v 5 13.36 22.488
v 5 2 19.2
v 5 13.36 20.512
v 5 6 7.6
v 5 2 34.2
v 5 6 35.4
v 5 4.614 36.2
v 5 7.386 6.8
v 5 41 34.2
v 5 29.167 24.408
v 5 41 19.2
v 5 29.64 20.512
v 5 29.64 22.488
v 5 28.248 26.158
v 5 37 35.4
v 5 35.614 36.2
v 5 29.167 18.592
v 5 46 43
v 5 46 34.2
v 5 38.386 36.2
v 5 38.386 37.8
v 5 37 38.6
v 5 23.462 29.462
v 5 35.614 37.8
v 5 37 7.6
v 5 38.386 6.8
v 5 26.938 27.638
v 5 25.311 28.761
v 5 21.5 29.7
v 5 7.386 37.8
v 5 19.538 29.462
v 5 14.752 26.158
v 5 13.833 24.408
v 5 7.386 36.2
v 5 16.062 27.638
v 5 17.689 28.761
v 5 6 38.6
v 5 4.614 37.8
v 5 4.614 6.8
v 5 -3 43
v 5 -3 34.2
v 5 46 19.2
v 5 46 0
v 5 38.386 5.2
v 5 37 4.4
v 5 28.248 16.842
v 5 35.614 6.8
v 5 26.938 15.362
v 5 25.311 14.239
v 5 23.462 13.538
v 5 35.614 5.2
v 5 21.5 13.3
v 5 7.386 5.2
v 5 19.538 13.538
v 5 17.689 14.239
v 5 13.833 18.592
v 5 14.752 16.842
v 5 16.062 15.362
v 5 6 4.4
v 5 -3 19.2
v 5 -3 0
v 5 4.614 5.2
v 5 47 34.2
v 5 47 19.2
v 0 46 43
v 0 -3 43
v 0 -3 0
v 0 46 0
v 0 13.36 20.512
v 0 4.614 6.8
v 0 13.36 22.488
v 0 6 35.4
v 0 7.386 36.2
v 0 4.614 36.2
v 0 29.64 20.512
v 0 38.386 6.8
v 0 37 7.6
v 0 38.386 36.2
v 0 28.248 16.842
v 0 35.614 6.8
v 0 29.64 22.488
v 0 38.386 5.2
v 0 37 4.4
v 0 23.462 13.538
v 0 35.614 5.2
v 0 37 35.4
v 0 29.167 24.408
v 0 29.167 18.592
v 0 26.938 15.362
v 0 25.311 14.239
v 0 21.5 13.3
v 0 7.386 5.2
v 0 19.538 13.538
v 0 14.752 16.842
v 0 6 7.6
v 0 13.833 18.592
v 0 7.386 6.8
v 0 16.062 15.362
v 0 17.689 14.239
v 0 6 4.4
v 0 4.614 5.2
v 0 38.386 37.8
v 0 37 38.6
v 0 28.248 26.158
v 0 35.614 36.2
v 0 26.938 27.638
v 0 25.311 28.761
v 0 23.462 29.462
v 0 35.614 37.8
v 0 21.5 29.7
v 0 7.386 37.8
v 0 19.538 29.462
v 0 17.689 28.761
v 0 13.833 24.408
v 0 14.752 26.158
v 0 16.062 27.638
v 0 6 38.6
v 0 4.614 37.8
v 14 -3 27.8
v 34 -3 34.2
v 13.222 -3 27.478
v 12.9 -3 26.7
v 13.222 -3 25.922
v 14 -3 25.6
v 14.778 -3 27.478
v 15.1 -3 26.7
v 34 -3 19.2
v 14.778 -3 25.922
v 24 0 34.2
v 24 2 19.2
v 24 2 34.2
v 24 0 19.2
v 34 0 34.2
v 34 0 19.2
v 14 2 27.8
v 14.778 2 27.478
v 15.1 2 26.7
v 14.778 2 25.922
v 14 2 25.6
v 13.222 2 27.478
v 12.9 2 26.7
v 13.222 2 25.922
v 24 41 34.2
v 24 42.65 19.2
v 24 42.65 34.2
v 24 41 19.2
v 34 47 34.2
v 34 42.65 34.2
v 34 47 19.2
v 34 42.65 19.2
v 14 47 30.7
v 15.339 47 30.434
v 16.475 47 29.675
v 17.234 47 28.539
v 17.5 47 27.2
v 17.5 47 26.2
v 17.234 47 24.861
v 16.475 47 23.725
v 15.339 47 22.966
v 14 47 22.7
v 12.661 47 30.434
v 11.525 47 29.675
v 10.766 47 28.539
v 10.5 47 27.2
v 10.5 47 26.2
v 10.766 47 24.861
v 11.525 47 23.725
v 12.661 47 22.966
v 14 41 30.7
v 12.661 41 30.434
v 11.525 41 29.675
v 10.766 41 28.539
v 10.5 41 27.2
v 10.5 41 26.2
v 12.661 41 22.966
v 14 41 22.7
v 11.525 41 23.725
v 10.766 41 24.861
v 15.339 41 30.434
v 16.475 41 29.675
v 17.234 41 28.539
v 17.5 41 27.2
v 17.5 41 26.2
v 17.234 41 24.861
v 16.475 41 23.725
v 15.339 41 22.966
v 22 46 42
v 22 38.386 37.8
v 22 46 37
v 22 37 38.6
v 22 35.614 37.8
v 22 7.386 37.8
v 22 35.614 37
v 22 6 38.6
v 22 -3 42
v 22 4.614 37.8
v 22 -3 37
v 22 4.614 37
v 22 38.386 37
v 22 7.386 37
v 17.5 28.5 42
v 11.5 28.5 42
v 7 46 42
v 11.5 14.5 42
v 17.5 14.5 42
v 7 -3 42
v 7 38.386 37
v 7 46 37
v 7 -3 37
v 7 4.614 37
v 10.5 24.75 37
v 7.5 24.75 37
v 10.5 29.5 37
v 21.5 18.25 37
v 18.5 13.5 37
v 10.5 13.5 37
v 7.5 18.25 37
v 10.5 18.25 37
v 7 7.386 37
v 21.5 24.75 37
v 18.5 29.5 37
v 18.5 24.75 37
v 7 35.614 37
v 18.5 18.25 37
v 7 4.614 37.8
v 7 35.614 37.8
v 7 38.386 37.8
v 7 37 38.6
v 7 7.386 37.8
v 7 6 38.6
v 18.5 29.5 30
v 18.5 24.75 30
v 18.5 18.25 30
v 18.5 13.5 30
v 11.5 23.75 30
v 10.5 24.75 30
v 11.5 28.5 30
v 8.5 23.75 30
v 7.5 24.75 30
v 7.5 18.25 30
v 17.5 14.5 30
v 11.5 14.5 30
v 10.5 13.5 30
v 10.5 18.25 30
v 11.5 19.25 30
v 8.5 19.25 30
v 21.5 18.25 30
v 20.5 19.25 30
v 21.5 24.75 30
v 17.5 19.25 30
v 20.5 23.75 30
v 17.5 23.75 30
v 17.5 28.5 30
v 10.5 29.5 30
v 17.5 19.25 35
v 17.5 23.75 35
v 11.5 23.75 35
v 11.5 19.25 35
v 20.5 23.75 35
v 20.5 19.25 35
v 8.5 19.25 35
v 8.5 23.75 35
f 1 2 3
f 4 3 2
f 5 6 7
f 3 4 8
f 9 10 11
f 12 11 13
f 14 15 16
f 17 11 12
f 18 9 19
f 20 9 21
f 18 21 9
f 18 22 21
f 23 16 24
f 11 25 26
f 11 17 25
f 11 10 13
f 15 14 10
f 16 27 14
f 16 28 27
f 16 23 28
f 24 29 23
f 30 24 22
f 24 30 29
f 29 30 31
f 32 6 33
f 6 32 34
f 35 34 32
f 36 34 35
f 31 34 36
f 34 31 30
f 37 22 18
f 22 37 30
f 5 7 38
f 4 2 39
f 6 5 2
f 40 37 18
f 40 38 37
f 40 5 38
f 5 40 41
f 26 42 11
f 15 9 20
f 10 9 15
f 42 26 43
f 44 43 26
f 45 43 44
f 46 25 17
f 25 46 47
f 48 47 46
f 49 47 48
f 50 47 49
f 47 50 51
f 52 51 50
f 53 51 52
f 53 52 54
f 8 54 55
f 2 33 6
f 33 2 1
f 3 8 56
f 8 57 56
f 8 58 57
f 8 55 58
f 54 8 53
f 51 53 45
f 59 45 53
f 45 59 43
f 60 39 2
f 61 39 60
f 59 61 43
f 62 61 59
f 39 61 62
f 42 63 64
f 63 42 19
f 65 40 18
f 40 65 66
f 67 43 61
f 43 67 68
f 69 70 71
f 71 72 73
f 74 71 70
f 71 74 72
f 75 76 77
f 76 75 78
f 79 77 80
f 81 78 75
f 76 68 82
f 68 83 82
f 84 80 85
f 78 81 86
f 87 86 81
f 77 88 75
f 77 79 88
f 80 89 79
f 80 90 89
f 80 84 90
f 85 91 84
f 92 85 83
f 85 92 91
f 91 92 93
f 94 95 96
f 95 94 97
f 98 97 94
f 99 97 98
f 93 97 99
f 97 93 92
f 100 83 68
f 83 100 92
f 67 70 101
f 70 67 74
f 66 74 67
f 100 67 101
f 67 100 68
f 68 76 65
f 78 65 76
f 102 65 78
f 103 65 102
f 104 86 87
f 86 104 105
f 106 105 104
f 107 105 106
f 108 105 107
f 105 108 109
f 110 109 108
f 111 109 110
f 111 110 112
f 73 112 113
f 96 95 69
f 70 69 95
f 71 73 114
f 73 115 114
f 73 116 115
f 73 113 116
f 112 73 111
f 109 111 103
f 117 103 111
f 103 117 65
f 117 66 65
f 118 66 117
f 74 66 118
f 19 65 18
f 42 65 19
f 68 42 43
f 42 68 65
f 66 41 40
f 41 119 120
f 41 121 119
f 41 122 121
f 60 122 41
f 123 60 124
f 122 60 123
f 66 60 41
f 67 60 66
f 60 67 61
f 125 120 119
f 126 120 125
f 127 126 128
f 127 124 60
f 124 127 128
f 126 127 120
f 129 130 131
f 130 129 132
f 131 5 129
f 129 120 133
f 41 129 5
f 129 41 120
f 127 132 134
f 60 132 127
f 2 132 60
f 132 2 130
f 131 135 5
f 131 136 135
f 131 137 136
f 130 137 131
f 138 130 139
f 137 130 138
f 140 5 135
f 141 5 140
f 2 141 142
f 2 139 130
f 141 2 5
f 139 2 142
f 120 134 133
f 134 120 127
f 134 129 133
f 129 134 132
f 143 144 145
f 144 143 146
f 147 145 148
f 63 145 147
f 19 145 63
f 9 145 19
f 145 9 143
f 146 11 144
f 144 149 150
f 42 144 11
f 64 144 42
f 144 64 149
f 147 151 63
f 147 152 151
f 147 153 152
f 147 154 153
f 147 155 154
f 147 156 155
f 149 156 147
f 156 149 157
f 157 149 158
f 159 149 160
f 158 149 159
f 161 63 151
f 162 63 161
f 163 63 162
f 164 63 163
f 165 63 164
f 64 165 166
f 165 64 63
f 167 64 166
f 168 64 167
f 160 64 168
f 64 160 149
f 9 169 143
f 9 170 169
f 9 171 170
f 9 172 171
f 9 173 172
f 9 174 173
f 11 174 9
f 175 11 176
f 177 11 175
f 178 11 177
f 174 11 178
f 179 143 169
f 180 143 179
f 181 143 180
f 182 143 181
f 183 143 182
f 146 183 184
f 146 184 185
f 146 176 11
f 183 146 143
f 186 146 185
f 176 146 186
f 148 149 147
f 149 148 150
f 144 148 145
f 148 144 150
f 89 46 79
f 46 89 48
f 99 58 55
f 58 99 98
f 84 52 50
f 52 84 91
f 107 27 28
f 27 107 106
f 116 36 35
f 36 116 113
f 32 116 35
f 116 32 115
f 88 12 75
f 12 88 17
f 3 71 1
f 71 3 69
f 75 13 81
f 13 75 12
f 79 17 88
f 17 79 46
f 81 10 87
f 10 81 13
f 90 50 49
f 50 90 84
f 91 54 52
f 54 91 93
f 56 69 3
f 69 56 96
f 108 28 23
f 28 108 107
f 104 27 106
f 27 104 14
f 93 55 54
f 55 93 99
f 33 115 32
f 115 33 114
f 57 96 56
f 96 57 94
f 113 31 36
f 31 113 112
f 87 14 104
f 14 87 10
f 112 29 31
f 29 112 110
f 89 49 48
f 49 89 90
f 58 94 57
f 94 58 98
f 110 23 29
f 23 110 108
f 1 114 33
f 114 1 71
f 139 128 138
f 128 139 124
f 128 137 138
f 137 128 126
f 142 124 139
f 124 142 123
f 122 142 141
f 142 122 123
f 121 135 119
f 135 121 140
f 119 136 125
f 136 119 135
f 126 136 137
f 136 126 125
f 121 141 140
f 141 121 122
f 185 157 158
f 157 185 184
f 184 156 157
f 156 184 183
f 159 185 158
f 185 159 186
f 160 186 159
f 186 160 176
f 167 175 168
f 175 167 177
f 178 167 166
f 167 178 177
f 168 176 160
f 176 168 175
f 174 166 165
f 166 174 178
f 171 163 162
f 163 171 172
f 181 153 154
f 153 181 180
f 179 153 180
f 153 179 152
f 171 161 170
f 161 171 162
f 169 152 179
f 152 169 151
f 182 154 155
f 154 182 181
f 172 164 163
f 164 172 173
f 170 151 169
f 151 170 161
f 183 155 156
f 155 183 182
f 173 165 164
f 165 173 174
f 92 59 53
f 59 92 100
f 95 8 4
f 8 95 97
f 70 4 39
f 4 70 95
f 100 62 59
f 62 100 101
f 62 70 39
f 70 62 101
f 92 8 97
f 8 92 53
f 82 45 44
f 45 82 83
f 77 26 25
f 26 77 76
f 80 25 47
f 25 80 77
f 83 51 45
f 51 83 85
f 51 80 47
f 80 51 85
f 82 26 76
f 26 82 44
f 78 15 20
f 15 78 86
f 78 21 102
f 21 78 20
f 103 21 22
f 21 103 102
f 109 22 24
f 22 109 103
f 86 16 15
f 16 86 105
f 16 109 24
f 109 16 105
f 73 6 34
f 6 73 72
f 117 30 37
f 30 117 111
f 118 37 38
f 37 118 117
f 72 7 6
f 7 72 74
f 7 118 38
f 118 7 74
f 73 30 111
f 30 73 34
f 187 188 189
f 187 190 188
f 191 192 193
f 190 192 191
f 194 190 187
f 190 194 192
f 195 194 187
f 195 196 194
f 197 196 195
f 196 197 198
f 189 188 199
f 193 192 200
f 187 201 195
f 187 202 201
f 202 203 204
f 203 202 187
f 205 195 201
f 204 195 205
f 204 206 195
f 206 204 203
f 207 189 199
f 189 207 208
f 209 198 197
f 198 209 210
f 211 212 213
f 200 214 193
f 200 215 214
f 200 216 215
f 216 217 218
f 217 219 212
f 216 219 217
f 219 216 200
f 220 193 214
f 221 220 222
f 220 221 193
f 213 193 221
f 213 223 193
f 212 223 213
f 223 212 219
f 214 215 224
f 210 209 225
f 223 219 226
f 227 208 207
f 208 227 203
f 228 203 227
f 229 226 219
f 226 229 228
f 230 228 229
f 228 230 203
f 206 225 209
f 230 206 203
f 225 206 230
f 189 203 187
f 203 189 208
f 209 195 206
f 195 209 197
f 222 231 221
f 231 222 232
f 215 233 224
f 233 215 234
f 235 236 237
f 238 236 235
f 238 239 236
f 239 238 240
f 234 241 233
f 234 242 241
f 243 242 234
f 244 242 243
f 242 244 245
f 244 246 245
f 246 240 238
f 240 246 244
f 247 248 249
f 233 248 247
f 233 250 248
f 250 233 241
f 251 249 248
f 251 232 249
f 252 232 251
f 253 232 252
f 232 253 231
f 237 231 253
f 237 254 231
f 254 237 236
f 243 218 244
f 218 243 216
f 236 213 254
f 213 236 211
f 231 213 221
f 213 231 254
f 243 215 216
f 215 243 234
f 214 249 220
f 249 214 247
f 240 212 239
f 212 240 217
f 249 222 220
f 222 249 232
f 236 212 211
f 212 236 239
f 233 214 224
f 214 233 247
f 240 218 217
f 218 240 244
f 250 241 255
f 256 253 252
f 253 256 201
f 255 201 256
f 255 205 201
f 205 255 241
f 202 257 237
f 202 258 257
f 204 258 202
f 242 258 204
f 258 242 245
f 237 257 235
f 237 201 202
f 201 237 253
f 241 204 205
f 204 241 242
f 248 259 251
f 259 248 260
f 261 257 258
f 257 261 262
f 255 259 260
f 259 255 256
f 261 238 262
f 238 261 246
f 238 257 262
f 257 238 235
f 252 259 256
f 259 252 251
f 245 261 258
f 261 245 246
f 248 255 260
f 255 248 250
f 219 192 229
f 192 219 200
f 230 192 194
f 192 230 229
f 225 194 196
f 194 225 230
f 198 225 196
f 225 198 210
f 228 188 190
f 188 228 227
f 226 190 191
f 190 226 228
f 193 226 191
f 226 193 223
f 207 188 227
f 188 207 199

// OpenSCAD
//translate([100,0,0]) import("./bowden_trubicky.stl");
tolerance=0.5;
polomer_bow=3.5;
difference() {
	union() {
		translate([0,-3,0]) cube([5,43+6,43]);

		translate([5,-3,19.2]) cube([19,5,15]);
		translate([24,-3,19.2]) cube([10,3,15]);

		translate([5,41,19.2]) cube([19,6,15]);
		translate([24,42.65,19.2]) cube([10,4.35,15]);
	}

//lozisko
	translate([-10,21.5,21.5]) rotate([0,90,0]) cylinder(r=8.2,h=50);

// fiament
	translate([14,-5,21.5+5.2]) rotate([-90,0,0]) cylinder(r=1.1,h=220,$fn=8);

translate([14,20,21.5+5.2-tolerance]) rotate([-90,0,0]) cylinder(r=polomer_bow,h=100, $fn=16);
translate([14,20,21.5+5.2+tolerance]) rotate([-90,0,0]) cylinder(r=polomer_bow,h=100, $fn=16);
translate([14-polomer_bow,20,21.5+5.2-tolerance]) cube([polomer_bow*2,100,tolerance*2]);


// srouby
	translate([-1,21.5-15.5,21.5-15.5]) rotate([0,90,0]) cylinder(r=1.6,h=20);
	translate([-1,21.5+15.5,21.5-15.5]) rotate([0,90,0]) cylinder(r=1.6,h=20);
	translate([-1,21.5+15.5,21.5+15.5]) rotate([0,90,0]) cylinder(r=1.6,h=20);
	translate([-1,21.5-15.5,21.5+15.5]) rotate([0,90,0]) cylinder(r=1.6,h=20);



}

// IDLER
translate([14.5-7.5,-3,37]) {
	difference() {
		union() {
			cube([15,49,5]);
			translate([4.5-1, 24.5-7-1, -7]) cube([6+2, 14+2, 12]);
			translate([7.5-6-1, 24.5-2.25-1, -7]) cube([12+2, 4.5+2, 8]);
		}
		translate([4.5, 24.5-7, -10]) cube([6, 14, 100]);
		translate([7.5-6, 24.5-2.25, -12]) cube([12, 4.5, 10]);
		translate([-1,9,0]) rotate([0,90,0]) cylinder(r=1.6,h=40);
		translate([-1,40,0]) rotate([0,90,0]) cylinder(r=1.6,h=40);
	}
}


// ložisko horní
//translate([9,16.5,26.075]) cube([10,10,10]);


// motor
//translate([24,21.5-21.15, 21.5-21.15]) cube([50,42.3,42.3]);


/*

vyska=20;
// horni kec 
translate([5,0,40]) {
difference() {union(){
	translate([2,-8,0]) cube([17,43+10+6,7.5]);
	//translate([9-7.5-1,20.5-2.5-1,-2]) cube([17,7,2]);

//	translate([0,42,-vyska]) cube([19,5,vyska]);
	}
	

translate([3.5,20.5-2.5,-1]) cube([13,5,6.5]);
translate([9-3,20.5-7.5,-15.5]) cube([6,15,30]);
//translate([9,-1,-1.5-4.5]) rotate([-90,0,0]) cylinder(r=1,h=120, $fn=8);
//translate([9,-1,-1.5-4.5-5]) rotate([-90,0,0]) cylinder(r=1,h=120, $fn=8)
;
//translate([9-1,41,-1.5-4.5-5]) cube([2,10,5]);
}

}*/
